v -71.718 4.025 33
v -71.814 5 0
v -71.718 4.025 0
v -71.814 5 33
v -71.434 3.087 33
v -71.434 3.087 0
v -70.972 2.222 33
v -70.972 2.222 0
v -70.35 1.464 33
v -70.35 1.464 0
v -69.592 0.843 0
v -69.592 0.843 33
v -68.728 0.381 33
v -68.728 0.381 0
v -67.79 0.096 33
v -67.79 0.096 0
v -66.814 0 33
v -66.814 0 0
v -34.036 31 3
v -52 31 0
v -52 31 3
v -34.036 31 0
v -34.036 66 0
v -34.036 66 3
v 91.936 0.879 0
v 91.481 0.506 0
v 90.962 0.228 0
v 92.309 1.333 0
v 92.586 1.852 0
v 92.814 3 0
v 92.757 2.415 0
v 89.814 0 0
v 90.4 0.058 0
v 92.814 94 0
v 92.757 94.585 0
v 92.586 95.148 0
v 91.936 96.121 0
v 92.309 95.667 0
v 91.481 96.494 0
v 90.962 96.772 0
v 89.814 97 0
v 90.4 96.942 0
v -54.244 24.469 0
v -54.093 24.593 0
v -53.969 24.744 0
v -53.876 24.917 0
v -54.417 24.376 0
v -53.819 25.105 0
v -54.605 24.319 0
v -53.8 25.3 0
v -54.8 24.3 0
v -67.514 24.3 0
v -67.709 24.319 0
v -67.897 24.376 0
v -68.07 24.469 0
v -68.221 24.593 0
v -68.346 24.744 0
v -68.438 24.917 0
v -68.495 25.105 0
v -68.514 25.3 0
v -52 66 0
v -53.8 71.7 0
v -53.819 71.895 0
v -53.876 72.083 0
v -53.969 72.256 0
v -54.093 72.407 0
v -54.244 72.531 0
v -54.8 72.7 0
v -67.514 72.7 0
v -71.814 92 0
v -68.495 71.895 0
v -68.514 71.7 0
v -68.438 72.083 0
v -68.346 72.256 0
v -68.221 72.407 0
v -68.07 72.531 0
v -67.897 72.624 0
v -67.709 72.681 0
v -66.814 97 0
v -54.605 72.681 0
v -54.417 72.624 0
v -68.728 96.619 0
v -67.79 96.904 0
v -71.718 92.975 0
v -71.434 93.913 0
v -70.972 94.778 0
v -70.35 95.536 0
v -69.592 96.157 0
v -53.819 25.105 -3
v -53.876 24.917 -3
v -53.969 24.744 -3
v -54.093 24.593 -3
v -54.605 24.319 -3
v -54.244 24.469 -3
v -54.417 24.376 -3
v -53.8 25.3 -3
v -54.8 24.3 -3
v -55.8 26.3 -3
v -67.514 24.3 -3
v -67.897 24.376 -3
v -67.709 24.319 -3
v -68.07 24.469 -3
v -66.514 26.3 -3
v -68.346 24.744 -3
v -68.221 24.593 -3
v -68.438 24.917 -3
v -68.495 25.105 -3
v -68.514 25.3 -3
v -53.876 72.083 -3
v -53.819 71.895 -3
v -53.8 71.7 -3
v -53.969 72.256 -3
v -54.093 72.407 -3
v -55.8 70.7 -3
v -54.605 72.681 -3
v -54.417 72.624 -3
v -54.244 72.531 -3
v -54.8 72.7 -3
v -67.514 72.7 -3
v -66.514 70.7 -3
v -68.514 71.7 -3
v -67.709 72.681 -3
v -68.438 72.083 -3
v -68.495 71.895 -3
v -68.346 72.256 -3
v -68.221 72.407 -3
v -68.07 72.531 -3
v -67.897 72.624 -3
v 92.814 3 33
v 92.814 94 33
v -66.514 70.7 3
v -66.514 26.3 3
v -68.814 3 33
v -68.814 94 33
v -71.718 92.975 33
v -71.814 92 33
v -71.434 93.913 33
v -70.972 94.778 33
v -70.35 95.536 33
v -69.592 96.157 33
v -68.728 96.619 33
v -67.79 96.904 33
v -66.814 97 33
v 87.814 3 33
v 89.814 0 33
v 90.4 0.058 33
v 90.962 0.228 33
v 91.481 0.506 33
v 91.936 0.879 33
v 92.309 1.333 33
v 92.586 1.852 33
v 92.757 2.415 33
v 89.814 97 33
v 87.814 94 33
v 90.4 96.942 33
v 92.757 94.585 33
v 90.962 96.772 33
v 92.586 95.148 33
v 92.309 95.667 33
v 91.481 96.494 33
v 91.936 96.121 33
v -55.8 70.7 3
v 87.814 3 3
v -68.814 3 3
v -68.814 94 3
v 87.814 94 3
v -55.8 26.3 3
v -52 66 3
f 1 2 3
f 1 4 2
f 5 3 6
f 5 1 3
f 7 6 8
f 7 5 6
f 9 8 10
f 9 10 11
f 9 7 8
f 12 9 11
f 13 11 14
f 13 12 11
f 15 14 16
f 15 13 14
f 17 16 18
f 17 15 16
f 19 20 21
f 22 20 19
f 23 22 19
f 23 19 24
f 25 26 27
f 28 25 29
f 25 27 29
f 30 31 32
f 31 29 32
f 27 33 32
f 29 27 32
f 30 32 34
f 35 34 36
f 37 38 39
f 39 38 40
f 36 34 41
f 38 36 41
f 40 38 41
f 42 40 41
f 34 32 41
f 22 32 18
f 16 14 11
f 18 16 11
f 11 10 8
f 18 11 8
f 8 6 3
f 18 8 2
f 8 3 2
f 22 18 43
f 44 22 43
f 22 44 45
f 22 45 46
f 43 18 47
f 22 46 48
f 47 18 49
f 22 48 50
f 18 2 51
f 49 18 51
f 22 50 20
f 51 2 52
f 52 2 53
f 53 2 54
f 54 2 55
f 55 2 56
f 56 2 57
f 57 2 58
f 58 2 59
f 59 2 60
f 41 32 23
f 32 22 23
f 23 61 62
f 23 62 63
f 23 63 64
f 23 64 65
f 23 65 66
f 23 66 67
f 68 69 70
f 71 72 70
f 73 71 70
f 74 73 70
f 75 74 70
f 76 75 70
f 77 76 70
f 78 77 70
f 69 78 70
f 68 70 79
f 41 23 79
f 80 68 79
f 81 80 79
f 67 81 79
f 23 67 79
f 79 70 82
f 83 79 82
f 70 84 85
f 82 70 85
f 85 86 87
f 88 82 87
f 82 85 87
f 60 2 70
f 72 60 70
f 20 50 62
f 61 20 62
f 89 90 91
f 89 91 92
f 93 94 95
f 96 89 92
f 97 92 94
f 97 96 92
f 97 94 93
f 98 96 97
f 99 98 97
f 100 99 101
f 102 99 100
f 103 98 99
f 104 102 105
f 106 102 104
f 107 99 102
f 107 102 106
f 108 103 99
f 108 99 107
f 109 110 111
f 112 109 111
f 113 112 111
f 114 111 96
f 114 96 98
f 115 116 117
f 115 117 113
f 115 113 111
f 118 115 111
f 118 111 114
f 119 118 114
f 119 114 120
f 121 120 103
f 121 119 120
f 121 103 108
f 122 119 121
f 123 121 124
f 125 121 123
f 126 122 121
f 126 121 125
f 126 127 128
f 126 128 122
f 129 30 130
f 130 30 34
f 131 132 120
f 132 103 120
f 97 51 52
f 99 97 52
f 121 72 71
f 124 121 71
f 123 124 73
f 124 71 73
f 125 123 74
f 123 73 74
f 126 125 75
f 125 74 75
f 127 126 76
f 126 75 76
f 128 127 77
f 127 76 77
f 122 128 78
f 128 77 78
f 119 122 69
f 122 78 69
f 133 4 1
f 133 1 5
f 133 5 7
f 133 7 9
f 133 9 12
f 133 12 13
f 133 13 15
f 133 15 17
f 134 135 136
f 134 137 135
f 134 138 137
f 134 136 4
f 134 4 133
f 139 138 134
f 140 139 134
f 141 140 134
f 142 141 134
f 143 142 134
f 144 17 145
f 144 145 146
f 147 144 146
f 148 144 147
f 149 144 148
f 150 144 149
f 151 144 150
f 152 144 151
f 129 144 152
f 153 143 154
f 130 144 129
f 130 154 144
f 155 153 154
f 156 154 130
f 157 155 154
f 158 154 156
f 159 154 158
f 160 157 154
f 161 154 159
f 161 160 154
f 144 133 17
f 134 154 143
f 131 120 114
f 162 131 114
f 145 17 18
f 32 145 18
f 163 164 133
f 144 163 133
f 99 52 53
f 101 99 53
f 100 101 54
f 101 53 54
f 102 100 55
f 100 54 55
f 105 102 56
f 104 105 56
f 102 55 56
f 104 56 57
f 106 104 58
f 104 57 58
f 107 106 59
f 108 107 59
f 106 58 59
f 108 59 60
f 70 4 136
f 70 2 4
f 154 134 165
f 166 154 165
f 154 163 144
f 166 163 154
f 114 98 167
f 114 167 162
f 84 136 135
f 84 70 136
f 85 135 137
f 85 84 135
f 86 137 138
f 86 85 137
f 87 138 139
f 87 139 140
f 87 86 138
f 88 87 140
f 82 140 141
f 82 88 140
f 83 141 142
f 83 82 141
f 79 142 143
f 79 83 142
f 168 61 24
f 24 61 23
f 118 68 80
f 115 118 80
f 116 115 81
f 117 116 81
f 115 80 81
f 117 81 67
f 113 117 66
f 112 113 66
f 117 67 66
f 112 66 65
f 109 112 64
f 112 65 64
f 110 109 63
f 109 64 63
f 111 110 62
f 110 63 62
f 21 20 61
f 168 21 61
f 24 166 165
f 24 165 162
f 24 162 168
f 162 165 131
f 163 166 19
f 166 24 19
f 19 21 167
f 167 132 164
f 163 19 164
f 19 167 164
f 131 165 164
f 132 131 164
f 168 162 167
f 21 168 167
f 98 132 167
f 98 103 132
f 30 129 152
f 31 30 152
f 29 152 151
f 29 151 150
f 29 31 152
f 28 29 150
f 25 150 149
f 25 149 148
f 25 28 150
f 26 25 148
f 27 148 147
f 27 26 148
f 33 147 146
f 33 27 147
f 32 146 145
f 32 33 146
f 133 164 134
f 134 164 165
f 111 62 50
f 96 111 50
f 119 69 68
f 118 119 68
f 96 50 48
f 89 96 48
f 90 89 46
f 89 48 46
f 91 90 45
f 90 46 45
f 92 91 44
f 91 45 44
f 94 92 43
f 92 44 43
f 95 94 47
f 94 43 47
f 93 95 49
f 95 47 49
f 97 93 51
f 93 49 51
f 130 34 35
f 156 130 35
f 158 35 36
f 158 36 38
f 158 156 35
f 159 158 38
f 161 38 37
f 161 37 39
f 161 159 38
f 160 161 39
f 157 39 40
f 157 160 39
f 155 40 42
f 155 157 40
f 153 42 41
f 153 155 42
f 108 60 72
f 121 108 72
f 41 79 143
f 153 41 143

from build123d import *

# Parameters (mm, degrees)
CROQUIS1_W                = 10.714275766
CROQUIS1_H                = 44.4
SALIENTE_EXTRUIR1_DEPTH   = 3
SALIENTE_EXTRUIR1_2_DEPTH = 3
CROQUIS2_W                = 143.628551532
CROQUIS2_H                = 97
CROQUIS2_W_2              = 17.964463827
CROQUIS2_H_2              = 35
CROQUIS2_W_3              = 10.714275766
CROQUIS2_H_3              = 44.4
SALIENTE_EXTRUIR2_DEPTH   = 3
CROQUIS3_W                = 143.628551532
CROQUIS3_H                = 97
CROQUIS3_W_2              = 137.628551532
CROQUIS3_H_2              = 91
SALIENTE_EXTRUIR3_DEPTH   = 30
REDONDEO1_R               = 5
CROQUIS4_W                = 35.073435796
CROQUIS4_H                = 97.224073942
CORTAR_EXTRUIR1_DEPTH     = 5
CORTAR_EXTRUIR2_START     = -3
CROQUIS6_W                = 10.714275766
CROQUIS6_H                = 44.4
CORTAR_EXTRUIR2_DEPTH     = 3
CROQUIS7_W                = 3
CROQUIS7_H                = 44.4
SALIENTE_EXTRUIR4_DEPTH   = 11
SALIENTE_EXTRUIR5_DEPTH   = 26
CROQUIS9_W                = 5
CROQUIS9_H                = 91
SALIENTE_EXTRUIR6_DEPTH   = 30
REDONDEO2_R               = 3


with BuildPart() as part:
    # Croquis1 → Saliente-Extruir1 (new body)
    with BuildSketch(Plane.XY):
        with BuildLine():
            ThreePointArc((-54.8, 72.7), (-54.092893219, 72.407106781), (-53.8, 71.7))
            Line((-53.8, 71.7), (-53.8, 25.3))
            ThreePointArc((-53.8, 25.3), (-54.092893219, 24.592893219), (-54.8, 24.3))
            Line((-54.8, 24.3), (-67.514275766, 24.3))
            ThreePointArc((-67.514275766, 24.3), (-68.221382548, 24.592893219), (-68.514275766, 25.3))
            Line((-68.514275766, 25.3), (-68.514275766, 71.7))
            ThreePointArc((-68.514275766, 71.7), (-68.221382548, 72.407106781), (-67.514275766, 72.7))
            Line((-67.514275766, 72.7), (-54.8, 72.7))
        make_face()
        with Locations((-61.157137883, 48.5)):
            Rectangle(CROQUIS1_W, CROQUIS1_H, mode=Mode.SUBTRACT)
    extrude(amount=-SALIENTE_EXTRUIR1_DEPTH)



with BuildPart() as body_2:
    # Croquis1 → Saliente-Extruir1 2 (new body)
    with BuildSketch(Plane.XY):
        with BuildLine():
            ThreePointArc((68.514275766, 25.3), (68.221382548, 24.592893219), (67.514275766, 24.3))
            Line((67.514275766, 24.3), (54.8, 24.3))
            ThreePointArc((54.8, 24.3), (54.092893219, 24.592893219), (53.8, 25.3))
            Line((53.8, 25.3), (53.8, 71.7))
            ThreePointArc((53.8, 71.7), (54.092893219, 72.407106781), (54.8, 72.7))
            Line((54.8, 72.7), (67.514275766, 72.7))
            ThreePointArc((67.514275766, 72.7), (68.221382548, 72.407106781), (68.514275766, 71.7))
            Line((68.514275766, 71.7), (68.514275766, 25.3))
        make_face()
        with Locations((61.157137883, 48.5)):
            Rectangle(CROQUIS1_W, CROQUIS1_H, mode=Mode.SUBTRACT)
    extrude(amount=-SALIENTE_EXTRUIR1_2_DEPTH)


with BuildPart() as part_1:
    add(part.part)

    add(body_2.part)  # Saliente-Extruir2 merges body 2
    # Croquis2 → Saliente-Extruir2 (add)
    with BuildSketch(Plane.XY):
        with Locations((0, 48.5)):
            Rectangle(CROQUIS2_W, CROQUIS2_H)
        with Locations((-43.017768086, 48.5)):
            Rectangle(CROQUIS2_W_2, CROQUIS2_H_2, mode=Mode.SUBTRACT)
        with Locations((61.157137883, 48.5)):
            Rectangle(CROQUIS2_W_3, CROQUIS2_H_3, mode=Mode.SUBTRACT)
        with Locations((-61.157137883, 48.5)):
            Rectangle(CROQUIS2_W_3, CROQUIS2_H_3, mode=Mode.SUBTRACT)
    extrude(amount=SALIENTE_EXTRUIR2_DEPTH)

    # Croquis3 → Saliente-Extruir3 (add)
    with BuildSketch(Plane.XY.offset(3)):
        with Locations((0, 48.5)):
            Rectangle(CROQUIS3_W, CROQUIS3_H)
        with Locations((0, 48.5)):
            Rectangle(CROQUIS3_W_2, CROQUIS3_H_2, mode=Mode.SUBTRACT)
    extrude(amount=SALIENTE_EXTRUIR3_DEPTH)

    # Redondeo1
    redondeo1_edges = [part_1.edges().sort_by_distance(p)[0] for p in [
        (71.814275766, 0, 16.5),
        (71.814275766, 97, 16.5),
        (-71.814275766, 97, 16.5),
        (-71.814275766, 0, 16.5),
    ]]
    fillet(redondeo1_edges, radius=REDONDEO1_R)

    # Croquis4 → Cortar-Extruir1 (cut)
    with BuildSketch(Plane(origin=(71.814275766, 0, 0), x_dir=(0, 0, -1), z_dir=(1, 0, 0))):
        with Locations((-17.536717898, 48.612036971)):
            Rectangle(CROQUIS4_W, CROQUIS4_H)
    extrude(amount=-CORTAR_EXTRUIR1_DEPTH, mode=Mode.SUBTRACT)

    # Croquis6 → Cortar-Extruir2 (cut)
    with BuildSketch(Plane(origin=(0, 0, -3), x_dir=(-1, 0, 0), z_dir=(0, 0, -1)).offset(CORTAR_EXTRUIR2_START)):
        with BuildLine():
            Line((-67.514275766, 24.3), (-54.8, 24.3))
            ThreePointArc((-54.8, 24.3), (-54.092893219, 24.592893219), (-53.8, 25.3))
            Line((-53.8, 25.3), (-53.8, 71.7))
            ThreePointArc((-53.8, 71.7), (-54.092893219, 72.407106781), (-54.8, 72.7))
            Line((-54.8, 72.7), (-67.514275766, 72.7))
            ThreePointArc((-67.514275766, 72.7), (-68.221382548, 72.407106781), (-68.514275766, 71.7))
            Line((-68.514275766, 71.7), (-68.514275766, 25.3))
            ThreePointArc((-68.514275766, 25.3), (-68.221382548, 24.592893219), (-67.514275766, 24.3))
        make_face()
        with Locations((-61.157137883, 48.5)):
            Rectangle(CROQUIS6_W, CROQUIS6_H, mode=Mode.SUBTRACT)
    extrude(amount=CORTAR_EXTRUIR2_DEPTH, mode=Mode.SUBTRACT)

    # Croquis7 → Saliente-Extruir4 (add)
    with BuildSketch(Plane(origin=(55.8, 0, 0), x_dir=(0, 0, -1), z_dir=(1, 0, 0))):
        with Locations((-1.5, 48.5)):
            Rectangle(CROQUIS7_W, CROQUIS7_H)
    extrude(amount=SALIENTE_EXTRUIR4_DEPTH)

    # Croquis8 → Saliente-Extruir5 (add)
    with BuildSketch(Plane(origin=(66.814275766, 0, 0), x_dir=(0, 0, -1), z_dir=(1, 0, 0))):
        Polygon((-33, 0), (0, 0), (0, 97), (-33, 97), (-33, 94), (-3, 94), (-3, 3), (-33, 3), align=None)
    extrude(amount=SALIENTE_EXTRUIR5_DEPTH)

    # Croquis9 → Saliente-Extruir6 (add)
    with BuildSketch(Plane.XY.offset(3)):
        with Locations((90.314275766, 48.5)):
            Rectangle(CROQUIS9_W, CROQUIS9_H)
    extrude(amount=SALIENTE_EXTRUIR6_DEPTH)

    # Redondeo2
    redondeo2_edges = [part_1.edges().sort_by_distance(p)[0] for p in [
        (92.814275766, 0, 16.5),
        (92.814275766, 97, 16.5),
    ]]
    fillet(redondeo2_edges, radius=REDONDEO2_R)


solid = part_1.part
